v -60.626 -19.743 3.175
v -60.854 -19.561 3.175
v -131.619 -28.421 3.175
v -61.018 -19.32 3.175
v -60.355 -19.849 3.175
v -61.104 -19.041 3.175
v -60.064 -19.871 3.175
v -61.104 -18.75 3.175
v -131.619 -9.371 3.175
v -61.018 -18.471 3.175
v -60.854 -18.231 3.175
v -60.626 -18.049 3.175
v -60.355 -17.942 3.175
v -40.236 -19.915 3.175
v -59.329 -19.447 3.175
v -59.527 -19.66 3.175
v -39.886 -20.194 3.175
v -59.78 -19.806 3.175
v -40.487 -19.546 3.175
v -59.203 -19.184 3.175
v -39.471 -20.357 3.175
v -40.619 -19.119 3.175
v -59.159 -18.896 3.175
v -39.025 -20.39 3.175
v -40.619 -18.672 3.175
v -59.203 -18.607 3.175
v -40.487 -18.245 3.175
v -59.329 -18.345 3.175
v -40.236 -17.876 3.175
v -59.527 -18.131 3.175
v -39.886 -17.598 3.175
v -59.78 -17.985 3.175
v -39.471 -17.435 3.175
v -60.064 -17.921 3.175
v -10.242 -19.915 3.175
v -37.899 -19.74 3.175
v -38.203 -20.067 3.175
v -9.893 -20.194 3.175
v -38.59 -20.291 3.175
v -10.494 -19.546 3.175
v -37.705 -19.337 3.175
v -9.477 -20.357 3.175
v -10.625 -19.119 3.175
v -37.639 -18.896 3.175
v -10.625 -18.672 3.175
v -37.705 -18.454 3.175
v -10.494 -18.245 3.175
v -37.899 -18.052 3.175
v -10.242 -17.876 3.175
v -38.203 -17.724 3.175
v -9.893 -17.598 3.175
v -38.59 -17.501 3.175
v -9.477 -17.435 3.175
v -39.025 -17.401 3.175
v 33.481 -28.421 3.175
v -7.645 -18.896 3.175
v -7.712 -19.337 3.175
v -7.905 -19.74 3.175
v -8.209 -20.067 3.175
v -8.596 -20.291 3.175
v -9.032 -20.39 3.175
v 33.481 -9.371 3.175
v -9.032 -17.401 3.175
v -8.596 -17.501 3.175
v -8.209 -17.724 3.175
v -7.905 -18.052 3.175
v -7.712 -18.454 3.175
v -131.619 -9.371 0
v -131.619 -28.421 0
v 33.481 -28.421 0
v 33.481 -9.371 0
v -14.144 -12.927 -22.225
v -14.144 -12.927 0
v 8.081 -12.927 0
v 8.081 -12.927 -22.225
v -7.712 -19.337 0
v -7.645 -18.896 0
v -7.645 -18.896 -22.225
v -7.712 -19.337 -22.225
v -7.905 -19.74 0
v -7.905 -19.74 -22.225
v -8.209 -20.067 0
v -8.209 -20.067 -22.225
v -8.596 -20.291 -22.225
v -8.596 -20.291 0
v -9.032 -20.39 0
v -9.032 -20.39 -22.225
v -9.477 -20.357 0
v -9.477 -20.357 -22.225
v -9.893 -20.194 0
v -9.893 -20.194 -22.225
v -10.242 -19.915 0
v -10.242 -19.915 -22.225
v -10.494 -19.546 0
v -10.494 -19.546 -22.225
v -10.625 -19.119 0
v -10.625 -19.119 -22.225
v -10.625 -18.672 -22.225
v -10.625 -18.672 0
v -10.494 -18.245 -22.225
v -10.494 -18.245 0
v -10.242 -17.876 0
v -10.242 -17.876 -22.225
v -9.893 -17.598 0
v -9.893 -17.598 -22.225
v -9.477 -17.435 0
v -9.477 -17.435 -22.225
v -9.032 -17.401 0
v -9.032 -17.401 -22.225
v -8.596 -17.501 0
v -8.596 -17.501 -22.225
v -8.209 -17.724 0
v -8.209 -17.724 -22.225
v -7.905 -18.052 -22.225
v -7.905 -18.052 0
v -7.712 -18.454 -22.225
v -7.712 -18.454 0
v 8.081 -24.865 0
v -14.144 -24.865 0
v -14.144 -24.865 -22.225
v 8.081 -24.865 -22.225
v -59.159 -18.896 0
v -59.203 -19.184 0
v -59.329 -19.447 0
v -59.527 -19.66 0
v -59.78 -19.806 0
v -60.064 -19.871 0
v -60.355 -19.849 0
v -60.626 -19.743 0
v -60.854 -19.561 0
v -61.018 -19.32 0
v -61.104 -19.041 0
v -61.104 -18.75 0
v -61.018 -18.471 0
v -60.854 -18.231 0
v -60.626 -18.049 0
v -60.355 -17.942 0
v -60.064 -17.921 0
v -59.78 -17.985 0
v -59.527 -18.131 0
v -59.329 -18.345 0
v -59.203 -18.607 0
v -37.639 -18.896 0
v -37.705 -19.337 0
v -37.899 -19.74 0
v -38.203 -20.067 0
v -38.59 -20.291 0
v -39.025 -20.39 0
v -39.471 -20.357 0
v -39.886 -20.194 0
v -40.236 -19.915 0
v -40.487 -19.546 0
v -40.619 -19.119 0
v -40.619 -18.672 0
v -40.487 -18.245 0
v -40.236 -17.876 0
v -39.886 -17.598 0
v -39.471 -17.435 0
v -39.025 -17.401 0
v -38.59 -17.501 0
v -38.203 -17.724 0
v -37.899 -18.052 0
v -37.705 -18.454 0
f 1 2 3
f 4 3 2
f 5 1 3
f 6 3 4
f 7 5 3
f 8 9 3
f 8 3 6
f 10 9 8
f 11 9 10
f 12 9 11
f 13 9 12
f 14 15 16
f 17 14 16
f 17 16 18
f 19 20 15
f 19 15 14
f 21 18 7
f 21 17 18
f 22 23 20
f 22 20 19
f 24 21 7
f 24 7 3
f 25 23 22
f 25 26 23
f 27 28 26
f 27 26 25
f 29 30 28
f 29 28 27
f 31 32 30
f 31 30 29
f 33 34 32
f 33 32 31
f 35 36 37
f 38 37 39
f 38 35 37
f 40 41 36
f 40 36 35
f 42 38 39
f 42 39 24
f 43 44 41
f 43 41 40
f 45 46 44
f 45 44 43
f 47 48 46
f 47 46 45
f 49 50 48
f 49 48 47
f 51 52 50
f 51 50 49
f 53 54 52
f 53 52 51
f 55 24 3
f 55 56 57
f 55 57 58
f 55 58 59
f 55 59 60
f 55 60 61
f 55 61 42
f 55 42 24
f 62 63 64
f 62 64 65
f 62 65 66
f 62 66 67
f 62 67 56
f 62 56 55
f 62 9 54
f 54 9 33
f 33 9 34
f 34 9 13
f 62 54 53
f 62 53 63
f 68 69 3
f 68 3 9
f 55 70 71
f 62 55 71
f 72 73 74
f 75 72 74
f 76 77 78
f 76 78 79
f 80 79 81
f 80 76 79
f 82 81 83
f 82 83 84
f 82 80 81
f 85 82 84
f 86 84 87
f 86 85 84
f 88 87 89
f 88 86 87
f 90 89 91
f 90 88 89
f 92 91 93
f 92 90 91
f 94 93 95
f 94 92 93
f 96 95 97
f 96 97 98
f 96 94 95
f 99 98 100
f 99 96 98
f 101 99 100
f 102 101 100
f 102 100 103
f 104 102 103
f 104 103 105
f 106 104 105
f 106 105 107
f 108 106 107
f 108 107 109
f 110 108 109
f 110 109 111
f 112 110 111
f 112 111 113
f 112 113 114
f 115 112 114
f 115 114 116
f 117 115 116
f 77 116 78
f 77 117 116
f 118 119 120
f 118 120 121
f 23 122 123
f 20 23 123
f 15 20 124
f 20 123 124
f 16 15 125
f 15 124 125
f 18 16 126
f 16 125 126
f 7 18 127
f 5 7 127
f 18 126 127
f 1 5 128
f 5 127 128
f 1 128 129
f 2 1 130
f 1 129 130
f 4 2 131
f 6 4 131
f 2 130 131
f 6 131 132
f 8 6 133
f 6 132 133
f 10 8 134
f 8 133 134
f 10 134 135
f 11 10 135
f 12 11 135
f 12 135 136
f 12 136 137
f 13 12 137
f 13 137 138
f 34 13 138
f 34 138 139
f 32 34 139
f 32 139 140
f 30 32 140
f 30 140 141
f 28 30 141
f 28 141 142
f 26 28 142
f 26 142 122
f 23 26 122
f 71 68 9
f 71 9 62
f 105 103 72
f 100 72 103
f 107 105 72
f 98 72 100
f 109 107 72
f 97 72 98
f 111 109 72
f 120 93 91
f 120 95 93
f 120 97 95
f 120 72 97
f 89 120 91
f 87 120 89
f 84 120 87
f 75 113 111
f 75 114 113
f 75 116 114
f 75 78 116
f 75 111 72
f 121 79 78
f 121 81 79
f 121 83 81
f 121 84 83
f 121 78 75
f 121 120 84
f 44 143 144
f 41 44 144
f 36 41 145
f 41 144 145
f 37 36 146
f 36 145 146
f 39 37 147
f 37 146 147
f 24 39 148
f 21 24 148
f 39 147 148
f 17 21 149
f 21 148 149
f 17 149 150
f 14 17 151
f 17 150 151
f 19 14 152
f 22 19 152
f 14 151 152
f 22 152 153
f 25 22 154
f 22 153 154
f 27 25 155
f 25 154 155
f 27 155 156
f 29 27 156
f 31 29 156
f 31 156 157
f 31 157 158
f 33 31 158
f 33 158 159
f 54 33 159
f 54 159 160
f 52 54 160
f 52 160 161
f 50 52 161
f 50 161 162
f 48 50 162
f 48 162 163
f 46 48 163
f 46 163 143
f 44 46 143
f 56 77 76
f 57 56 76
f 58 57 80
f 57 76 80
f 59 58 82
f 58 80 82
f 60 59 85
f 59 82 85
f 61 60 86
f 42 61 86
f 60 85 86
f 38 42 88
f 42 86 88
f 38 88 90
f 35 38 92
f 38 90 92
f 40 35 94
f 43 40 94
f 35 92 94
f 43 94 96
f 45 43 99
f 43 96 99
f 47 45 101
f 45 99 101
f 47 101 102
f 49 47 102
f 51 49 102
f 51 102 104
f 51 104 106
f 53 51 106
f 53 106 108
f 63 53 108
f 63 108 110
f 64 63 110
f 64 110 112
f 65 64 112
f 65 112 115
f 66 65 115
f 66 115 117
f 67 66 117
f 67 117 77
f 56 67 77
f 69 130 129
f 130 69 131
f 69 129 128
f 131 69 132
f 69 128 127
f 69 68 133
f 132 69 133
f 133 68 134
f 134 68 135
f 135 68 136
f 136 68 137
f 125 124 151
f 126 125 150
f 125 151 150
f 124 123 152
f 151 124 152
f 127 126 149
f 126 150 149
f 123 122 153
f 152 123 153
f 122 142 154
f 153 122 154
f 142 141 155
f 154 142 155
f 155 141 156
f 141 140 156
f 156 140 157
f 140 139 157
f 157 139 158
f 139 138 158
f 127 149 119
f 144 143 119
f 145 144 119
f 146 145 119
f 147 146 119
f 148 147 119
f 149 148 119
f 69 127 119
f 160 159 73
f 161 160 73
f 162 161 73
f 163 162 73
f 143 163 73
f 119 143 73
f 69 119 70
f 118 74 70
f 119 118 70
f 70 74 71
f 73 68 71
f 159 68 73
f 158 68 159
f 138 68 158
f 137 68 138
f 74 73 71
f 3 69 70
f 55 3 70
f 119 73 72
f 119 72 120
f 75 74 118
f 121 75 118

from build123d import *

# Parameters (mm, degrees)
F0_W     = 165.1
F0_H     = 19.05
F1_DEPTH = 3.175
F2_R     = 1.4986
F3_DEPTH = 25.4
F2_R_2   = 0.9779
F4_DEPTH = 25.4
F5_DEPTH = 25.4
F2_W     = 22.225
F2_H     = 11.938
F6_DEPTH = 22.225


with BuildPart() as f1:
    # F0 (on Top) → F1 (new body)
    with BuildSketch(Plane.XY):
        with Locations((-49.068541, -18.8957)):
            Rectangle(F0_W, F0_H)
    extrude(amount=F1_DEPTH)

    # F2 (on face) → F3 (cut)
    with BuildSketch(Plane(origin=(0, 0, 0), x_dir=(1, 0, 0), z_dir=(0, 0, -1))):
        with Locations((-39.137141, 18.8957)):
            Circle(F2_R)
    extrude(amount=-F3_DEPTH, mode=Mode.SUBTRACT)

    # F2 (on face) → F4 (cut)
    with BuildSketch(Plane(origin=(0, 0, 0), x_dir=(1, 0, 0), z_dir=(0, 0, -1))):
        with Locations((-60.137141, 18.8957)):
            Circle(F2_R_2)
    extrude(amount=-F4_DEPTH, mode=Mode.SUBTRACT)

    # F2 (on face) → F5 (cut)
    with BuildSketch(Plane(origin=(0, 0, 0), x_dir=(1, 0, 0), z_dir=(0, 0, -1))):
        with Locations((-9.143541, 18.8957)):
            Circle(F2_R)
    extrude(amount=-F5_DEPTH, mode=Mode.SUBTRACT)

    # F2 (on face) → F6 (join)
    with BuildSketch(Plane(origin=(0, 0, 0), x_dir=(1, 0, 0), z_dir=(0, 0, -1))):
        with Locations((-3.031041, 18.8957)):
            Rectangle(F2_W, F2_H)
        with Locations((-9.143541, 18.8957)):
            Circle(F2_R, mode=Mode.SUBTRACT)
    extrude(amount=F6_DEPTH)


solid = f1.part
